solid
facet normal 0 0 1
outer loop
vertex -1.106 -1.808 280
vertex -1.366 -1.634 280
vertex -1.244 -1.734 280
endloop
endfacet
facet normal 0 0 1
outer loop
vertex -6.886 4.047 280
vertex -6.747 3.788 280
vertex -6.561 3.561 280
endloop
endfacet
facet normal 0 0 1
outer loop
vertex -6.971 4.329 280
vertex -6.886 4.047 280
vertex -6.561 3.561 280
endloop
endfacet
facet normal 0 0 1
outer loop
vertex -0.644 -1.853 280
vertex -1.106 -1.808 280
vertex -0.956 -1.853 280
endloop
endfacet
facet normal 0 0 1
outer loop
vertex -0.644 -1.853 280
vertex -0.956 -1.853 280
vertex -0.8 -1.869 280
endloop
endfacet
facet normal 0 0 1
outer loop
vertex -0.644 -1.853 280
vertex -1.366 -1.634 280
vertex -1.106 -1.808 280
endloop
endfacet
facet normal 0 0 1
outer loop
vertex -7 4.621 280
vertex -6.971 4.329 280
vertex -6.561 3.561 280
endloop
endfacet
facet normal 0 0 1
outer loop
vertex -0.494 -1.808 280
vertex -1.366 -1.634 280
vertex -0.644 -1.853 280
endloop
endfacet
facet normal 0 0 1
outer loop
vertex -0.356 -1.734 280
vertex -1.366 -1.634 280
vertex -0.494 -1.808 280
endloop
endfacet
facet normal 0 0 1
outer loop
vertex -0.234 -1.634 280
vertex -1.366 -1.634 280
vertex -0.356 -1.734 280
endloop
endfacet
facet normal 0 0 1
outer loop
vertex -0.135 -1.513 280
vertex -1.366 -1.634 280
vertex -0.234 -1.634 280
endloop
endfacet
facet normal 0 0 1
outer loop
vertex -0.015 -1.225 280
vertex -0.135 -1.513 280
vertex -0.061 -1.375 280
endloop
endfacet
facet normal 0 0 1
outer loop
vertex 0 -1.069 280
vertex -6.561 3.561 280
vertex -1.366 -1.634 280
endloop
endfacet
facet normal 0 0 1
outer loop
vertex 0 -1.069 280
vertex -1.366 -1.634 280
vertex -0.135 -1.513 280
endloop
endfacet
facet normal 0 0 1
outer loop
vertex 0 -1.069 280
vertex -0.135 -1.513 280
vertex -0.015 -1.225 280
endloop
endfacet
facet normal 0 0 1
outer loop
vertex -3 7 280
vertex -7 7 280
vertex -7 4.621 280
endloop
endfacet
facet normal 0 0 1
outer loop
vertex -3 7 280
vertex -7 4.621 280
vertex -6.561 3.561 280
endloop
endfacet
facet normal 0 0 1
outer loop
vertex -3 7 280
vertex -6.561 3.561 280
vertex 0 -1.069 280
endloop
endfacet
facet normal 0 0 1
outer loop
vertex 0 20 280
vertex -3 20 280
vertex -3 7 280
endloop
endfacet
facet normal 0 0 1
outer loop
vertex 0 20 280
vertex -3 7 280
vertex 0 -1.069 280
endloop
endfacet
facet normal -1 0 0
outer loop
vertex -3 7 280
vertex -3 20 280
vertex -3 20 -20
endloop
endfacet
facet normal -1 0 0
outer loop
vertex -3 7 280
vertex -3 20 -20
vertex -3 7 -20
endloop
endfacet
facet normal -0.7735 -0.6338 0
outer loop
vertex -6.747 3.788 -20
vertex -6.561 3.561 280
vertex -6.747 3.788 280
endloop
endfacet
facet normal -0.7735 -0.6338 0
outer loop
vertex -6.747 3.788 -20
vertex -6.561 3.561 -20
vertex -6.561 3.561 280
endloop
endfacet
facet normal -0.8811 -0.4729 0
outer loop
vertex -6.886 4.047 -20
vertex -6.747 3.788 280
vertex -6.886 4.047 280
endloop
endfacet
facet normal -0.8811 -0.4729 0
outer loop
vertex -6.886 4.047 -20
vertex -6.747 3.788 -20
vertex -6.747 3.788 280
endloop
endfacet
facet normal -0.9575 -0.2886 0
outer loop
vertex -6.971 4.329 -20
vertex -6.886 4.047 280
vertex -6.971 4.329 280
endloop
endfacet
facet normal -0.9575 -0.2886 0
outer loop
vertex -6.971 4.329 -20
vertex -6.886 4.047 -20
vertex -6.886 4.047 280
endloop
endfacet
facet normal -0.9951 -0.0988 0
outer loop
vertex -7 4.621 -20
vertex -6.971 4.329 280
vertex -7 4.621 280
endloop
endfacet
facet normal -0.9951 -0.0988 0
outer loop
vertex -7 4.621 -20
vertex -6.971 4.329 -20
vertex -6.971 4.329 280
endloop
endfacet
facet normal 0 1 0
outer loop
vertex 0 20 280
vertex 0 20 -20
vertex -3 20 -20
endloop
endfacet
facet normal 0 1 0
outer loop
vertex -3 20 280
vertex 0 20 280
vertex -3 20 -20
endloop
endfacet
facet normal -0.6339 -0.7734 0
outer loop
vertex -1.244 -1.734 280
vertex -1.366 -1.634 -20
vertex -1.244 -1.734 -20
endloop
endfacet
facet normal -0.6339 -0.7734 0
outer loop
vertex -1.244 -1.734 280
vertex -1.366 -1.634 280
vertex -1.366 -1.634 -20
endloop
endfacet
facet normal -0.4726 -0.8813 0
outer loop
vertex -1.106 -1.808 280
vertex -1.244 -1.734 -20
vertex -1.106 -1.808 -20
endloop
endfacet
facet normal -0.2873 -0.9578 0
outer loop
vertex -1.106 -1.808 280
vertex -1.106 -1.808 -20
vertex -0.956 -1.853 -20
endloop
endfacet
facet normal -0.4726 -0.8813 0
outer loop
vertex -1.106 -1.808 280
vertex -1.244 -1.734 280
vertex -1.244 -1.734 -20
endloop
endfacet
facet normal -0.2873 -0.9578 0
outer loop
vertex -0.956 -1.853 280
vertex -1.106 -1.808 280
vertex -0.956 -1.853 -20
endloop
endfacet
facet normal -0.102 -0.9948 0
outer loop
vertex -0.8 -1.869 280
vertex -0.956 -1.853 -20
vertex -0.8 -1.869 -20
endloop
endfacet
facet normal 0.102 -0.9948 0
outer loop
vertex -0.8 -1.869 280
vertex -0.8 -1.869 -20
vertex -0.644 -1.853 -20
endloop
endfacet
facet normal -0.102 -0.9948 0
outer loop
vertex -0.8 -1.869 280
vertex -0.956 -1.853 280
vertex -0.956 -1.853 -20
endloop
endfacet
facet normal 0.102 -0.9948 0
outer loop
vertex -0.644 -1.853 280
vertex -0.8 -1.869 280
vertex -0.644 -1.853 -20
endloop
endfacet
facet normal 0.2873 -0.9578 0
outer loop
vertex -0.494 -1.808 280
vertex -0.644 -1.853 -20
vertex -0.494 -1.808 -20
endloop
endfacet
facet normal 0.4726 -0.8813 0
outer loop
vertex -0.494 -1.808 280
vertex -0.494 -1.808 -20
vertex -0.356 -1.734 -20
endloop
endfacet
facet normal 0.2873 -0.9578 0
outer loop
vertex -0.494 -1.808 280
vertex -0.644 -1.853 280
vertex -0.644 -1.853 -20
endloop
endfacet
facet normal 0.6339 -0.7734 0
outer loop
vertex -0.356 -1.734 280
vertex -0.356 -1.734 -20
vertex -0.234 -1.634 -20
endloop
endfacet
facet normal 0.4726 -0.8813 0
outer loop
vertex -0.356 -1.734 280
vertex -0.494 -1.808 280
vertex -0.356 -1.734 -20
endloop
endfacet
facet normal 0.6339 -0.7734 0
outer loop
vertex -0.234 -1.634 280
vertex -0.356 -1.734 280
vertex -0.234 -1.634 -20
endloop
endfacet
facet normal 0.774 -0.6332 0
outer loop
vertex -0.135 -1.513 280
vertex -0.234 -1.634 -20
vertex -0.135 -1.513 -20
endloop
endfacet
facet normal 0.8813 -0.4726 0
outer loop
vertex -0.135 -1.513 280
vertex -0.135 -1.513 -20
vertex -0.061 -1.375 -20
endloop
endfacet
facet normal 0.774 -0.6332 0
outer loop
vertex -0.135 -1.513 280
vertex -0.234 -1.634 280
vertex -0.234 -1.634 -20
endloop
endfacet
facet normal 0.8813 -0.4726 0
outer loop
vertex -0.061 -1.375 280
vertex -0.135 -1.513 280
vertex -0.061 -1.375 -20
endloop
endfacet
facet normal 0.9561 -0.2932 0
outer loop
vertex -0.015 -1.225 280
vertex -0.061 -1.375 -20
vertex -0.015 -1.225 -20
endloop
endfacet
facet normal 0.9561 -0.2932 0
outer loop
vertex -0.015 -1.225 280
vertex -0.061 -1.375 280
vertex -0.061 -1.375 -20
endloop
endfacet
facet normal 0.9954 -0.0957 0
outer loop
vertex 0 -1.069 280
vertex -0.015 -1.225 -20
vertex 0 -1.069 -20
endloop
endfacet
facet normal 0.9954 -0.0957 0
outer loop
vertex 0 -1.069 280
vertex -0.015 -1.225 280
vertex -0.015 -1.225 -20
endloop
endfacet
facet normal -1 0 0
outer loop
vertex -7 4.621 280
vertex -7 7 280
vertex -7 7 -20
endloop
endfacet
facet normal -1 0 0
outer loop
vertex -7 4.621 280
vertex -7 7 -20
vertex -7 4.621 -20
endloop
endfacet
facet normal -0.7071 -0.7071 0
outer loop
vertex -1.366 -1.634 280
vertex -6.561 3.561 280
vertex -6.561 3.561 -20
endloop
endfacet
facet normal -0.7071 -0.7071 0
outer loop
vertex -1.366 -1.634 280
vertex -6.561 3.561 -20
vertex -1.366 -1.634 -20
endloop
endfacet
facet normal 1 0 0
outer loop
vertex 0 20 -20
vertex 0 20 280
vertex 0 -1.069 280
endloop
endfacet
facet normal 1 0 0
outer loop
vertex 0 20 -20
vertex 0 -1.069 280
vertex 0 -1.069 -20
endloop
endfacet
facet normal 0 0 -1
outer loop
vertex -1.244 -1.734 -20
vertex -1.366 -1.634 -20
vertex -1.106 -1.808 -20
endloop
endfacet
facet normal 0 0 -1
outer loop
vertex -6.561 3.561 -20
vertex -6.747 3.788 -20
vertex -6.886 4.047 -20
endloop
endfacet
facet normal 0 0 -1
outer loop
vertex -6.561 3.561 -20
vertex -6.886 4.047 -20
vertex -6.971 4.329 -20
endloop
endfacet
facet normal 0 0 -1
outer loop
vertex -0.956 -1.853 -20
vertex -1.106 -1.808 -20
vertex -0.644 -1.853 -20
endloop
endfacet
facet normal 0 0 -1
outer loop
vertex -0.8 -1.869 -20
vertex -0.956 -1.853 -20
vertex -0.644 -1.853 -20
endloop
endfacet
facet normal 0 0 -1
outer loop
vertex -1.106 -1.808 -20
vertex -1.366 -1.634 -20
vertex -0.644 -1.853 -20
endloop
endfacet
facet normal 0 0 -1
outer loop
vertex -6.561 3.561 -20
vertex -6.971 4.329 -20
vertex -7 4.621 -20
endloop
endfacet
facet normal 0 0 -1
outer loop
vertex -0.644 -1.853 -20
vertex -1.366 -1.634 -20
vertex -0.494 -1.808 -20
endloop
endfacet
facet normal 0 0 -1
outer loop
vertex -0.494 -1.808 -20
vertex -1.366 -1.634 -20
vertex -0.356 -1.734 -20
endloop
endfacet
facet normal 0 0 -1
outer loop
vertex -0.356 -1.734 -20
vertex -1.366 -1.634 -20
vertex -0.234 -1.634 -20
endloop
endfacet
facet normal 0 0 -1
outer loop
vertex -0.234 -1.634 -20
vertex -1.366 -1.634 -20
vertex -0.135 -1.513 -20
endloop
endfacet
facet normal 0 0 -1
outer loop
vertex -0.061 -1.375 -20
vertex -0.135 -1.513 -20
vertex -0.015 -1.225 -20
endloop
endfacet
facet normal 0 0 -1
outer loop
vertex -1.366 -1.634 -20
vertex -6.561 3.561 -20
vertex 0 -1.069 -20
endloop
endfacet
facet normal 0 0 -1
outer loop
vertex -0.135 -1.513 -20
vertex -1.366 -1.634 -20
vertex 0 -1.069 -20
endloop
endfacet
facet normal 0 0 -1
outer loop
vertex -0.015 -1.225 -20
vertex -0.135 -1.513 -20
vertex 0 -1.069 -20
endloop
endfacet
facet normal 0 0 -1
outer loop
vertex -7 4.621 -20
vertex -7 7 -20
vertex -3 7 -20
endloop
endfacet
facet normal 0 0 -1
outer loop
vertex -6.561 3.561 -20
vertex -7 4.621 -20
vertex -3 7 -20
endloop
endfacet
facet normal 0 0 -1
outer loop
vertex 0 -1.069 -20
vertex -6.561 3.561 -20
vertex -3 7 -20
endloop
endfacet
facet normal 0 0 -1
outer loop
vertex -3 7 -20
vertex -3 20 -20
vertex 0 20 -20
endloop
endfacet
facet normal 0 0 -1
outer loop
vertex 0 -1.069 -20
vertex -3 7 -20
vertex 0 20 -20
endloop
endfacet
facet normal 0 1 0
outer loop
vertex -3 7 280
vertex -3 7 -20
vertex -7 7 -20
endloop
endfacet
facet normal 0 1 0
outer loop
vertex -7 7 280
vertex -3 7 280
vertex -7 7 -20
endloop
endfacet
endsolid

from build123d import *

# Parameters (mm, degrees)
BOSS_EXTRUDE1_DEPTH = 300
FILLET1_R           = 1.5
SKETCH2_W           = 20
SKETCH2_H           = 300
CUT_EXTRUDE1_DEPTH  = 10
FILLET2_R           = 0.8


with BuildPart() as part:
    # Sketch1 → Boss-Extrude1 (new body)
    with BuildSketch(Plane.XY.offset(280)):
        Polygon((-7, 4), (4, -7), (7, -7), (7, -3), (20, -3), (20, 0), (0, 0), (0, 20), (-3, 20), (-3, 7), (-7, 7), align=None)
    extrude(amount=-BOSS_EXTRUDE1_DEPTH)

    # Fillet1
    fillet1_edges = [part.edges().sort_by_distance(p)[0] for p in [
        (4, -7, 130),
        (-7, 4, 130),
    ]]
    fillet(fillet1_edges, radius=FILLET1_R)

    # Sketch2 → Cut-Extrude1 (cut)
    with BuildSketch(Plane(origin=(0, 0, 0), x_dir=(1, 0, 0), z_dir=(0, 1, 0))):
        with Locations((10, -130)):
            Rectangle(SKETCH2_W, SKETCH2_H)
    extrude(amount=-CUT_EXTRUDE1_DEPTH, mode=Mode.SUBTRACT)

    # Fillet2
    fillet2_edges = [part.edges().sort_by_distance(p)[0] for p in [
        (0, -3, 130),
    ]]
    fillet(fillet2_edges, radius=FILLET2_R)


solid = part.part
